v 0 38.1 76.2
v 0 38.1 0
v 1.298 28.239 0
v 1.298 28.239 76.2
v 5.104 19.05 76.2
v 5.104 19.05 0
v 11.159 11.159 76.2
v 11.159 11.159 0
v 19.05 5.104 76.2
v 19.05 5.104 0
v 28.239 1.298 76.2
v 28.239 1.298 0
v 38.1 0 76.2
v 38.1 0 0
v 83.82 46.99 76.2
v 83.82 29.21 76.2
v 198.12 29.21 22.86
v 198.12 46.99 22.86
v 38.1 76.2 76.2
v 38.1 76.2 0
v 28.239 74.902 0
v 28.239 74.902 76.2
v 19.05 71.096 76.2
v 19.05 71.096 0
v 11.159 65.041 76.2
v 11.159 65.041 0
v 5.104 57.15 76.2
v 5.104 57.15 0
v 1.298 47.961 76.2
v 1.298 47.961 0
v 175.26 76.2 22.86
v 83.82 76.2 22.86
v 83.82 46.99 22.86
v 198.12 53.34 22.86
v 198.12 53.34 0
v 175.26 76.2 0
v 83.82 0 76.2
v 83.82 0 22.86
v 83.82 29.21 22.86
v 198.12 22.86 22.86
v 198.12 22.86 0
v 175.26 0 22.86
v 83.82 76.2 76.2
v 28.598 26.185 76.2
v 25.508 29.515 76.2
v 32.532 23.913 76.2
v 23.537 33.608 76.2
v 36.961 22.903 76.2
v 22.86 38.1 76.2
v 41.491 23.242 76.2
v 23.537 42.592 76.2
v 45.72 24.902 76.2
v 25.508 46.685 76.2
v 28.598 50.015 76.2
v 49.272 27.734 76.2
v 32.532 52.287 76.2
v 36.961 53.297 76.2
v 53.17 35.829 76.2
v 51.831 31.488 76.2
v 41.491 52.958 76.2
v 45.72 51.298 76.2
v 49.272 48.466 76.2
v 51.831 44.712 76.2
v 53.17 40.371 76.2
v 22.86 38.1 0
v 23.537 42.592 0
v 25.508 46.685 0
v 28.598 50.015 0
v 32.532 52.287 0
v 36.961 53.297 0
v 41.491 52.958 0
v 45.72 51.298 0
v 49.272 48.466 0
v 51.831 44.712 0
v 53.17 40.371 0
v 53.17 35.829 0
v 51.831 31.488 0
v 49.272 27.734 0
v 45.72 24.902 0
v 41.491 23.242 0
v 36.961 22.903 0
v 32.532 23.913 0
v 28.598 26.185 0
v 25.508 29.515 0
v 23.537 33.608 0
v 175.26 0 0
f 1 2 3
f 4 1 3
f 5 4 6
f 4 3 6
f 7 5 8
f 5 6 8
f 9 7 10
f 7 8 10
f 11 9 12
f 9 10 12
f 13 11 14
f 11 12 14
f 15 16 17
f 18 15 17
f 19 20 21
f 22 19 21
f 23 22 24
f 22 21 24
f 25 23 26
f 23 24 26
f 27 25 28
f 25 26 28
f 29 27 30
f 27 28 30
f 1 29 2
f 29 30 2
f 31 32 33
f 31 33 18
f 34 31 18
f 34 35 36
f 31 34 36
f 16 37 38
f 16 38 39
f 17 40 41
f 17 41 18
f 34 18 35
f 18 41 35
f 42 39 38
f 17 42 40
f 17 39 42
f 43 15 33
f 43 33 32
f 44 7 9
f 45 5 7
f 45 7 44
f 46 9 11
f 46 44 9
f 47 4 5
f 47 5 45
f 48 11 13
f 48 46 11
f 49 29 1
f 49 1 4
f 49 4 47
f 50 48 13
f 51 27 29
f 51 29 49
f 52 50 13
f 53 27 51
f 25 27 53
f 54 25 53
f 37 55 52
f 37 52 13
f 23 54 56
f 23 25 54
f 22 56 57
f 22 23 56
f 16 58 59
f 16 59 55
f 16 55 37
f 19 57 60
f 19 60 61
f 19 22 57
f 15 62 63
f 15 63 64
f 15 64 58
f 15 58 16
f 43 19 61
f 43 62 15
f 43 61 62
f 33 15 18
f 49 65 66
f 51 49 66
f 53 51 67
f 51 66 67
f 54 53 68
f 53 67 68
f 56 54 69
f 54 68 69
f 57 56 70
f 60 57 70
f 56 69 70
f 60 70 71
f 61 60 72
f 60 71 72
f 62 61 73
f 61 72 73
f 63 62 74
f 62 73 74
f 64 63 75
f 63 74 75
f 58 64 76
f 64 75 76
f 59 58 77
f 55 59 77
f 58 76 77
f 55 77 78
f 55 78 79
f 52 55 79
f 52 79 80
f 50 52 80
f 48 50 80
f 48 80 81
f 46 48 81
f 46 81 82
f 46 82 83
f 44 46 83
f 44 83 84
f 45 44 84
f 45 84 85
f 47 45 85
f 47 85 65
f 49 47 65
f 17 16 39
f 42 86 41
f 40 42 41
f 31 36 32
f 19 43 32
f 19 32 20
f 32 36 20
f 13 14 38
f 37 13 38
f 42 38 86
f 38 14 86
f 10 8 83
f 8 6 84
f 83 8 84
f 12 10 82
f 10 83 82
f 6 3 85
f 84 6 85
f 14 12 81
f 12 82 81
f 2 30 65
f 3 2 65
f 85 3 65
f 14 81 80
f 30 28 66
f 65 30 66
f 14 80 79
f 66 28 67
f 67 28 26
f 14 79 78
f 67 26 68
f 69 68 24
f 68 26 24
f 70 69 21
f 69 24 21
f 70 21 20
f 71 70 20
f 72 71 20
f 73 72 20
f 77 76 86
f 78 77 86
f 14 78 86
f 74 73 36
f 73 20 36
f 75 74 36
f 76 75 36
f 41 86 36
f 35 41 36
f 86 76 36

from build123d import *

# Parameters (mm, degrees)
F1_DEPTH = 76.2
F3_D     = 30.48
F2_W     = 114.3
F2_H     = 29.21
F4_DEPTH = 53.34
F6_DEPTH = 17.78
F8_DEPTH = 22.86


with BuildPart() as f1:
    # F0 (on Top) → F1 (new body)
    with BuildSketch(Plane.XY):
        with BuildLine():
            ThreePointArc((0, 38.1), (11.159232, 11.159232), (38.1, 0))
            Line((38.1, 0), (198.12, 0))
            Line((198.12, 0), (198.12, 76.2))
            Line((198.12, 76.2), (38.1, 76.2))
            ThreePointArc((38.1, 76.2), (11.159232, 65.040768), (0, 38.1))
        make_face()
    extrude(amount=F1_DEPTH)

    # F3 (through all)
    with Locations(Plane.XY.offset(76.2)):
        with Locations((38.1, 38.1)):
            Hole(F3_D / 2)

    # F2 (on face) → F4 (cut)
    with BuildSketch(Plane.XY.offset(76.2)):
        with Locations((140.97, 61.595)):
            Rectangle(F2_W, F2_H)
        with Locations((140.97, 14.605)):
            Rectangle(F2_W, F2_H)
    extrude(amount=-F4_DEPTH, mode=Mode.SUBTRACT)

    # F5 (on face) → F6 (cut)
    with BuildSketch(Plane.XZ.offset(-29.21)):
        Polygon((198.12, 76.2), (83.82, 76.2), (198.12, 22.86), align=None)
    extrude(amount=-F6_DEPTH, mode=Mode.SUBTRACT)

    # F7 (on face) → F8 (cut)
    with BuildSketch(Plane(origin=(0, 0, 0), x_dir=(1, 0, 0), z_dir=(0, 0, -1))):
        Polygon((198.12, 0), (175.26, 0), (198.12, -22.86), align=None)
        Polygon((198.12, -76.2), (198.12, -53.34), (175.26, -76.2), align=None)
    extrude(amount=-F8_DEPTH, mode=Mode.SUBTRACT)


solid = f1.part
